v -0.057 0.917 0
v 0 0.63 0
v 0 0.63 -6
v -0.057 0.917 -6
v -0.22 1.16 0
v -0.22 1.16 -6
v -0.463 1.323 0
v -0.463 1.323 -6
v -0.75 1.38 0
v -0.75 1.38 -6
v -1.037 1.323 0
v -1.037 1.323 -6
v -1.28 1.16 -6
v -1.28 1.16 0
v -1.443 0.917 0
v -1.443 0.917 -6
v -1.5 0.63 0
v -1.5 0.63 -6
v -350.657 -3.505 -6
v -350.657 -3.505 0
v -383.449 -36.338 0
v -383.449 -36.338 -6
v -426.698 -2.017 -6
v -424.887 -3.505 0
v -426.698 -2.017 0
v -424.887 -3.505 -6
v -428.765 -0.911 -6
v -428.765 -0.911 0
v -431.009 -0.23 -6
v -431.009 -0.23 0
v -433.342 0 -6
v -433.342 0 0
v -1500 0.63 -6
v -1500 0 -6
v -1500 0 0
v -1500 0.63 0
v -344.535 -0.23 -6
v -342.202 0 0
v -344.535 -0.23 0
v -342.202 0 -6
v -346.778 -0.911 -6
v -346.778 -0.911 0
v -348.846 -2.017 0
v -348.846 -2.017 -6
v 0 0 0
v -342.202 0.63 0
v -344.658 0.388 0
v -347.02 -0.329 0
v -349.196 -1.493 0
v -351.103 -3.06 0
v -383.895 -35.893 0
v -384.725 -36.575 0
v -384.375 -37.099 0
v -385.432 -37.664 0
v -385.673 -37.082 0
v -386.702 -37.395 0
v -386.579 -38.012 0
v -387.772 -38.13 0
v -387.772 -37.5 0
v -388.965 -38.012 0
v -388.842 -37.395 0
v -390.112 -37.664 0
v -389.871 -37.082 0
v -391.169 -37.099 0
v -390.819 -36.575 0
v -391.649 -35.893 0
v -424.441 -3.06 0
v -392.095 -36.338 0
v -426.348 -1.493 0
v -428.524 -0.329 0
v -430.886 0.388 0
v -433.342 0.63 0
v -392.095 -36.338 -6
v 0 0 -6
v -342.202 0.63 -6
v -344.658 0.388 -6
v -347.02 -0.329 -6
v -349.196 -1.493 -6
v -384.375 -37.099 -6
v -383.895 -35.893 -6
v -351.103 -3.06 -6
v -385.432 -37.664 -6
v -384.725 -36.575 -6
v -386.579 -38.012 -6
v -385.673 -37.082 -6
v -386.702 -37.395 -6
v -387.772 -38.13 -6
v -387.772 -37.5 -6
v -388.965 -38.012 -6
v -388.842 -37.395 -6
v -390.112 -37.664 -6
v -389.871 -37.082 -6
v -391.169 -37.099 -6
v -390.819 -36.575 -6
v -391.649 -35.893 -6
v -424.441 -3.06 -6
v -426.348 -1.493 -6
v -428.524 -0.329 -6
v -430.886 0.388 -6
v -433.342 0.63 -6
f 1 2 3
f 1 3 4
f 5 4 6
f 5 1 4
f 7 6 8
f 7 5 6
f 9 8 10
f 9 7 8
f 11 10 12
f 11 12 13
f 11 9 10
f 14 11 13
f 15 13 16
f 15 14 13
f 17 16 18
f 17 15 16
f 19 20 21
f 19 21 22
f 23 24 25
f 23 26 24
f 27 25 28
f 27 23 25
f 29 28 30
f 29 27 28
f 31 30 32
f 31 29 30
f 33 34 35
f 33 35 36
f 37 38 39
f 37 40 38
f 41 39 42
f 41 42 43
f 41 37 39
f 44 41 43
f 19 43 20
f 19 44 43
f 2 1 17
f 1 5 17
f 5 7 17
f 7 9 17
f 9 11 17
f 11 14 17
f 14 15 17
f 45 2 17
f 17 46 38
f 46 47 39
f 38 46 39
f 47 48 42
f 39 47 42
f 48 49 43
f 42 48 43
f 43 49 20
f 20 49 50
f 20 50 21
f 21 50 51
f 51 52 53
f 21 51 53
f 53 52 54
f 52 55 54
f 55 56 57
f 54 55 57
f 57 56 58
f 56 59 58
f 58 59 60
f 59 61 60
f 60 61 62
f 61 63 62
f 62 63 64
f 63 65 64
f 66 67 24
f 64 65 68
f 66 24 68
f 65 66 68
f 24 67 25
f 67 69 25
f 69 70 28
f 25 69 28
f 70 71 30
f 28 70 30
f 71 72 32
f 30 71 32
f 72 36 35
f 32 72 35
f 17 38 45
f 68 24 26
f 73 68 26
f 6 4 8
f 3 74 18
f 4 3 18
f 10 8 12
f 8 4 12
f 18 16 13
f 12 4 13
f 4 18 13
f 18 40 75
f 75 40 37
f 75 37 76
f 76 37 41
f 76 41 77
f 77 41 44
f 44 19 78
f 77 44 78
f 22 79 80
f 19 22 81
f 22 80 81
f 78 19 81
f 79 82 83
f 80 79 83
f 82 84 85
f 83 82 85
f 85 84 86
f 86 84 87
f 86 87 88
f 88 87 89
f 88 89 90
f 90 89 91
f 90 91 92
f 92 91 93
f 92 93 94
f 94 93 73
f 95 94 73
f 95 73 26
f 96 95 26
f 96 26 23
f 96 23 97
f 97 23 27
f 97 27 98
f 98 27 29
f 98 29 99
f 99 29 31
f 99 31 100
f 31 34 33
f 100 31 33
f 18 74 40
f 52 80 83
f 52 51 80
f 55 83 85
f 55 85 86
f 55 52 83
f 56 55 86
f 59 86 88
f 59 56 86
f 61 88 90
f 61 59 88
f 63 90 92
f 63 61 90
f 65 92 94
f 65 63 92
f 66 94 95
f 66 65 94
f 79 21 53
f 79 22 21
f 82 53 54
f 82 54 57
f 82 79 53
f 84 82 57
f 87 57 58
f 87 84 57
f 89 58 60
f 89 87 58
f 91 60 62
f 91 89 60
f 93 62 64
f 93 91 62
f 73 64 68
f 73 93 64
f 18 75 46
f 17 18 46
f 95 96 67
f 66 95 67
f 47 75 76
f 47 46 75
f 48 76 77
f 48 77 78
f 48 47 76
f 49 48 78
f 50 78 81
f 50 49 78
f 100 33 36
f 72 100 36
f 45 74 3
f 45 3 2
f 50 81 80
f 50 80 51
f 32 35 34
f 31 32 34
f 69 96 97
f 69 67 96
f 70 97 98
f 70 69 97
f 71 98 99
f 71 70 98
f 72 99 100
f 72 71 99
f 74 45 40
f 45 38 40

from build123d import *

# Parameters (mm, degrees)
SKETCH1_W           = 6
SKETCH1_H           = 0.63
BOSS_EXTRUDE1_DEPTH = 6


with BuildPart() as part:
    # Sweep1: sweep along a path in Sketch2
    with BuildLine(Plane.XY) as sweep1_path:
        Line((0, 0), (-342.20186112, 0))
        ThreePointArc((-342.20186112, 0), (-346.778350853, -0.911057943), (-350.657025134, -3.505315192))
        Line((-350.657025134, -3.505315192), (-383.448760524, -36.337742609))
        ThreePointArc((-383.448760524, -36.337742609), (-387.77186112, -38.13), (-392.094961716, -36.337742609))
        Line((-392.094961716, -36.337742609), (-424.886697107, -3.505315192))
        ThreePointArc((-424.886697107, -3.505315192), (-428.765371388, -0.911057943), (-433.34186112, 0))
        Line((-433.34186112, 0), (-1500, 0))
    # Sketch1 → Sweep1 (sweep)
    with BuildSketch(Plane(origin=(0, 0, 0), x_dir=(0, 0, -1), z_dir=(1, 0, 0))):
        with Locations((3, 0.315)):
            Rectangle(SKETCH1_W, SKETCH1_H)
    sweep(path=sweep1_path.line)

    # Sketch3 → Boss-Extrude1 (add, through all)
    with BuildSketch(Plane.XY):
        with BuildLine():
            Line((-1.5, 0.63), (-1.5, 0))
            Line((-1.5, 0), (0, 0))
            Line((0, 0), (0, 0.63))
            ThreePointArc((0, 0.63), (-0.75, 1.38), (-1.5, 0.63))
        make_face()
    extrude(amount=-BOSS_EXTRUDE1_DEPTH)


solid = part.part
